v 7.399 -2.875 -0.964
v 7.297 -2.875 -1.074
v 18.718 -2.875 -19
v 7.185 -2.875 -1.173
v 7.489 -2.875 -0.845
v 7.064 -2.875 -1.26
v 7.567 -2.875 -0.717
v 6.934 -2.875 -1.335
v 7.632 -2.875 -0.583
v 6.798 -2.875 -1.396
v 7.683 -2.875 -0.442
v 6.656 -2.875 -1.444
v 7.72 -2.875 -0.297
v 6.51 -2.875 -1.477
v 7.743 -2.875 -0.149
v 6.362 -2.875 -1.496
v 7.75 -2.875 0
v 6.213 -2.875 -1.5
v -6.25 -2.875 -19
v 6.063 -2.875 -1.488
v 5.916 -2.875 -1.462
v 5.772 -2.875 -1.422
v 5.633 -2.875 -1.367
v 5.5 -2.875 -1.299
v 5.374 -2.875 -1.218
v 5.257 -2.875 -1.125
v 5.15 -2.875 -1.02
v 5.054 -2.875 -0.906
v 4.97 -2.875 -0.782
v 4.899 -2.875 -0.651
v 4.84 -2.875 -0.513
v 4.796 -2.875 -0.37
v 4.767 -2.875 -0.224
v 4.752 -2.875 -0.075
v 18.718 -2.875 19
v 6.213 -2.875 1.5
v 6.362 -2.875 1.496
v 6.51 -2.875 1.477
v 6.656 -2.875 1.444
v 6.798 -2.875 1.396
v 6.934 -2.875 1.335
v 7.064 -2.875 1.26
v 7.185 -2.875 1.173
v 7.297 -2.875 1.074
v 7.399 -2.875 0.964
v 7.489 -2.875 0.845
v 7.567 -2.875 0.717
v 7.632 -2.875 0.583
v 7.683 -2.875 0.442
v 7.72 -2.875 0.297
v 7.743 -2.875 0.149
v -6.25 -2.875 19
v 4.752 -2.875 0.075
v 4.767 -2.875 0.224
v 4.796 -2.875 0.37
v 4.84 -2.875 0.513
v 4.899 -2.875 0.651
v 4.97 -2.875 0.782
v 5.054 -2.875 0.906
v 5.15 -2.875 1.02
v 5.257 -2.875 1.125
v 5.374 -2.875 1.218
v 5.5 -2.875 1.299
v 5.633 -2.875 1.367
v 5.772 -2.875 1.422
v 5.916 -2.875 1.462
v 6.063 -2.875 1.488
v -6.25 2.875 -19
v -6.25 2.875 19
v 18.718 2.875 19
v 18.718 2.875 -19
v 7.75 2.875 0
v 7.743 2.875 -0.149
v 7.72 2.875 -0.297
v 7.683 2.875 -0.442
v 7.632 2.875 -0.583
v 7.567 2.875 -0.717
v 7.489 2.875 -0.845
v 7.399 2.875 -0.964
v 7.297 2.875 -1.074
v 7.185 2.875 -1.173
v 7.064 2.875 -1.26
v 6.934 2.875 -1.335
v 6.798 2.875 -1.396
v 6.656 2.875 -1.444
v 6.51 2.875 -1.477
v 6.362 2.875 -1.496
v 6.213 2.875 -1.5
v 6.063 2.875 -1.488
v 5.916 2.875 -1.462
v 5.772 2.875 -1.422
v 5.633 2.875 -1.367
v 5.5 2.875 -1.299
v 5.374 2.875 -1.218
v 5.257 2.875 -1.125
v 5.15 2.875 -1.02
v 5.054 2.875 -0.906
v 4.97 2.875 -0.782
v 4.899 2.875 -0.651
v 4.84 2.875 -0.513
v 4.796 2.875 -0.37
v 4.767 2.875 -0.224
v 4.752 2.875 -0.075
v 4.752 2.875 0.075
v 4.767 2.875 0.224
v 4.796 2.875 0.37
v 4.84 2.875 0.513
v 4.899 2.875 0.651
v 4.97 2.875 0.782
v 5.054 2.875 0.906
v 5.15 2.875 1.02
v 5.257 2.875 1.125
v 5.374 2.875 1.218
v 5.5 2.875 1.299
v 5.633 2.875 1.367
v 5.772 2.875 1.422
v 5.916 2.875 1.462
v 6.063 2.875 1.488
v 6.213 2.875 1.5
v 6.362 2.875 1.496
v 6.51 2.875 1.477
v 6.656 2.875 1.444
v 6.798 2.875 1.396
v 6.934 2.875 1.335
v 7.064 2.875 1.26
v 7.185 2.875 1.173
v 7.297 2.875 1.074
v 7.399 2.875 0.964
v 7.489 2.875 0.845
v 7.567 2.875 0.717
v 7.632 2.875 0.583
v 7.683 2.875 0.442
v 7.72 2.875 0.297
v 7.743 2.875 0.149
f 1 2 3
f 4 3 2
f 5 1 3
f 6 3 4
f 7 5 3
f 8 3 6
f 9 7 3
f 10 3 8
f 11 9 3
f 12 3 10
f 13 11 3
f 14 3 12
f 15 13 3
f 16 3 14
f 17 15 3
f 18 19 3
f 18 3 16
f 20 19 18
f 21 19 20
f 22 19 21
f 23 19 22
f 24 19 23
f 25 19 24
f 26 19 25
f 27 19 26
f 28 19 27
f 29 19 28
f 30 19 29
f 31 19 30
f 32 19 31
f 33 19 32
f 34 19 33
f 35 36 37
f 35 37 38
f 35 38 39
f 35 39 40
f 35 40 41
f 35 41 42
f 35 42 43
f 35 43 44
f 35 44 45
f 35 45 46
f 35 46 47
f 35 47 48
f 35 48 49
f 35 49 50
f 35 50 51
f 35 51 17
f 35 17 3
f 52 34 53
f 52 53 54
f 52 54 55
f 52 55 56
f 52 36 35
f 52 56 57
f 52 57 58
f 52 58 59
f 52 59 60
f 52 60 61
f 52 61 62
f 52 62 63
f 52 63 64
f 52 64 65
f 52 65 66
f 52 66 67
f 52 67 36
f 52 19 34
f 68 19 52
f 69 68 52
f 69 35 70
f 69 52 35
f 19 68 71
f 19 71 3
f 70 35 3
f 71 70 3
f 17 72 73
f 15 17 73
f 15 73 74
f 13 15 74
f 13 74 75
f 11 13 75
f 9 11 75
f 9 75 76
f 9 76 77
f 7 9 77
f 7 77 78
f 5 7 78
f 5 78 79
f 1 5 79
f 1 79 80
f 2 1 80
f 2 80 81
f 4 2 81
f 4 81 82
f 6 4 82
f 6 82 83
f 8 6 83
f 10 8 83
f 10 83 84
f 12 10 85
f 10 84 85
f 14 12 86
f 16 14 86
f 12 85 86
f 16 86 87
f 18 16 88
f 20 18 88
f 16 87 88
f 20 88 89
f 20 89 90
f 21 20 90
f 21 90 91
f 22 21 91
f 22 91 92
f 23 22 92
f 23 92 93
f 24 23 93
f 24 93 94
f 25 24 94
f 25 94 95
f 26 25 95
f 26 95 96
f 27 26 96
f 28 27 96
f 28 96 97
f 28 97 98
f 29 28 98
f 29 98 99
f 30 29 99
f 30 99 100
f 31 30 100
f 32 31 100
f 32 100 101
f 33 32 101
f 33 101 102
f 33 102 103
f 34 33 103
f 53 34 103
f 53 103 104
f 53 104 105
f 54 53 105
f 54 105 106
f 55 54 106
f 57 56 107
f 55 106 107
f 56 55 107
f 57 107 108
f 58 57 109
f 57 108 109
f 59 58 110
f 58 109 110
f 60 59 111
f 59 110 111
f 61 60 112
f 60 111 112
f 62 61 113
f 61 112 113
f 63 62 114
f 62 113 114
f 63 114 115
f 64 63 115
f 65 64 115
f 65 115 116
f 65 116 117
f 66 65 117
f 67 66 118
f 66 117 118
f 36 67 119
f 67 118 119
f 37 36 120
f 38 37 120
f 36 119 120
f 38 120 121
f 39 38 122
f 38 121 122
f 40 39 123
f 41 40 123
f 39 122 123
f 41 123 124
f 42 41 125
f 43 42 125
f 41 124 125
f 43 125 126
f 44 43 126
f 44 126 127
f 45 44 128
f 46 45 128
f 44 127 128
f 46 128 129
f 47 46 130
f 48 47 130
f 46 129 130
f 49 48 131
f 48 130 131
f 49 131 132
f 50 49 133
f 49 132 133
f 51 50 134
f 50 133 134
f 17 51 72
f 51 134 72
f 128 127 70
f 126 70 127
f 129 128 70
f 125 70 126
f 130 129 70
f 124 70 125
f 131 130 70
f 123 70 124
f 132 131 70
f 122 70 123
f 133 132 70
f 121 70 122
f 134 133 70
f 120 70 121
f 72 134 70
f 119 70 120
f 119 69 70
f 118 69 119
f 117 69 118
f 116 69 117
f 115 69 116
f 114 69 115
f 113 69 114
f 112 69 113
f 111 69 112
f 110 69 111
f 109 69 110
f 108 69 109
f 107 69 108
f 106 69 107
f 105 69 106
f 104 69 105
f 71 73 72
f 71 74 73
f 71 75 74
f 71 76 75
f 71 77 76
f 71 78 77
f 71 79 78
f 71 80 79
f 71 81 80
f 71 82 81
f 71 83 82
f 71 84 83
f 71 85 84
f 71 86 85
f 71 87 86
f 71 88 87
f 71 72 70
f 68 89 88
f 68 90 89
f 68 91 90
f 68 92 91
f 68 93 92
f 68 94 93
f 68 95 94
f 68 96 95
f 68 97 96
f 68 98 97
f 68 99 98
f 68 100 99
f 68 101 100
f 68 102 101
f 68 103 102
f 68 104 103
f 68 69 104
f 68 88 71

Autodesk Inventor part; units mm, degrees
ref_plane "YZ Plane" through (0, 0, 0) normal (1, 0, 0) x (0, 1, 0)
ref_plane "XZ Plane" through (0, 0, 0) normal (0, 1, 0) x (-1, 0, 0)
ref_plane "XY Plane" through (0, 0, 0) normal (0, 0, 1) x (1, 0, 0)
sketch "Sketch1" plane through (0, 0, 0) normal (1, 0, 0) x (0, 1, 0)
  line L0 (2.875, -19) -> (-2.875, -19)
  line L1 (-2.875, -19) -> (-2.875, 19)
  line L2 (-2.875, 19) -> (2.875, 19)
  line L3 (2.875, 19) -> (2.875, -19)
  line L4 (2.875, -19) -> (-2.875, 19) construction
  line L5 (-2.875, -19) -> (2.875, 19) construction
  point P0 (0, 0)
  dimension "d0" = 5.75
  dimension "d1" = 38
extrude "Extrusion1" add sketch "Sketch1" along normal blind 12.5
sketch "Sketch2" plane through (0, 2.875, 19) normal (0, 1, 0) x (1, 0, 0)
  circle A0 centre (6.25, 19) radius 1.5
  point P0 (0, 19)
  dimension "d4" = 3
extrude "Extrusion2" cut sketch "Sketch2" against normal blind 12.5
sketch "Sketch3" plane through (12.5, 0, 0) normal (1, 0, 0) x (0, 0, -1)
  point P0 (0, 0)
sketch "Sketch4" plane through (0, -2.875, -19) normal (0, -1, 0) x (1, 0, 0)
  line L0 (0, 0) -> (0, 38) projected
  line L1 (0, 0) -> (-6.25, 0)
  line L2 (-6.25, 0) -> (-6.25, 38)
  line L3 (-6.25, 38) -> (0, 38)
  line L4 (0, 38) -> (0, 0)
  line L5 (12.4682, 38) -> (18.7182, 38)
  line L6 (18.7182, 38) -> (18.7182, 0)
  line L7 (18.7182, 0) -> (12.4682, 0)
  line L8 (12.4682, 0) -> (12.4682, 38)
  point P0 (0, 19)
  dimension "d7" = 6.25
  dimension "d8" = 6.25
extrude "Extrusion3" add sketch "Sketch4" against normal up to surface (5.75 mm away)
properties part number "servoArm"
